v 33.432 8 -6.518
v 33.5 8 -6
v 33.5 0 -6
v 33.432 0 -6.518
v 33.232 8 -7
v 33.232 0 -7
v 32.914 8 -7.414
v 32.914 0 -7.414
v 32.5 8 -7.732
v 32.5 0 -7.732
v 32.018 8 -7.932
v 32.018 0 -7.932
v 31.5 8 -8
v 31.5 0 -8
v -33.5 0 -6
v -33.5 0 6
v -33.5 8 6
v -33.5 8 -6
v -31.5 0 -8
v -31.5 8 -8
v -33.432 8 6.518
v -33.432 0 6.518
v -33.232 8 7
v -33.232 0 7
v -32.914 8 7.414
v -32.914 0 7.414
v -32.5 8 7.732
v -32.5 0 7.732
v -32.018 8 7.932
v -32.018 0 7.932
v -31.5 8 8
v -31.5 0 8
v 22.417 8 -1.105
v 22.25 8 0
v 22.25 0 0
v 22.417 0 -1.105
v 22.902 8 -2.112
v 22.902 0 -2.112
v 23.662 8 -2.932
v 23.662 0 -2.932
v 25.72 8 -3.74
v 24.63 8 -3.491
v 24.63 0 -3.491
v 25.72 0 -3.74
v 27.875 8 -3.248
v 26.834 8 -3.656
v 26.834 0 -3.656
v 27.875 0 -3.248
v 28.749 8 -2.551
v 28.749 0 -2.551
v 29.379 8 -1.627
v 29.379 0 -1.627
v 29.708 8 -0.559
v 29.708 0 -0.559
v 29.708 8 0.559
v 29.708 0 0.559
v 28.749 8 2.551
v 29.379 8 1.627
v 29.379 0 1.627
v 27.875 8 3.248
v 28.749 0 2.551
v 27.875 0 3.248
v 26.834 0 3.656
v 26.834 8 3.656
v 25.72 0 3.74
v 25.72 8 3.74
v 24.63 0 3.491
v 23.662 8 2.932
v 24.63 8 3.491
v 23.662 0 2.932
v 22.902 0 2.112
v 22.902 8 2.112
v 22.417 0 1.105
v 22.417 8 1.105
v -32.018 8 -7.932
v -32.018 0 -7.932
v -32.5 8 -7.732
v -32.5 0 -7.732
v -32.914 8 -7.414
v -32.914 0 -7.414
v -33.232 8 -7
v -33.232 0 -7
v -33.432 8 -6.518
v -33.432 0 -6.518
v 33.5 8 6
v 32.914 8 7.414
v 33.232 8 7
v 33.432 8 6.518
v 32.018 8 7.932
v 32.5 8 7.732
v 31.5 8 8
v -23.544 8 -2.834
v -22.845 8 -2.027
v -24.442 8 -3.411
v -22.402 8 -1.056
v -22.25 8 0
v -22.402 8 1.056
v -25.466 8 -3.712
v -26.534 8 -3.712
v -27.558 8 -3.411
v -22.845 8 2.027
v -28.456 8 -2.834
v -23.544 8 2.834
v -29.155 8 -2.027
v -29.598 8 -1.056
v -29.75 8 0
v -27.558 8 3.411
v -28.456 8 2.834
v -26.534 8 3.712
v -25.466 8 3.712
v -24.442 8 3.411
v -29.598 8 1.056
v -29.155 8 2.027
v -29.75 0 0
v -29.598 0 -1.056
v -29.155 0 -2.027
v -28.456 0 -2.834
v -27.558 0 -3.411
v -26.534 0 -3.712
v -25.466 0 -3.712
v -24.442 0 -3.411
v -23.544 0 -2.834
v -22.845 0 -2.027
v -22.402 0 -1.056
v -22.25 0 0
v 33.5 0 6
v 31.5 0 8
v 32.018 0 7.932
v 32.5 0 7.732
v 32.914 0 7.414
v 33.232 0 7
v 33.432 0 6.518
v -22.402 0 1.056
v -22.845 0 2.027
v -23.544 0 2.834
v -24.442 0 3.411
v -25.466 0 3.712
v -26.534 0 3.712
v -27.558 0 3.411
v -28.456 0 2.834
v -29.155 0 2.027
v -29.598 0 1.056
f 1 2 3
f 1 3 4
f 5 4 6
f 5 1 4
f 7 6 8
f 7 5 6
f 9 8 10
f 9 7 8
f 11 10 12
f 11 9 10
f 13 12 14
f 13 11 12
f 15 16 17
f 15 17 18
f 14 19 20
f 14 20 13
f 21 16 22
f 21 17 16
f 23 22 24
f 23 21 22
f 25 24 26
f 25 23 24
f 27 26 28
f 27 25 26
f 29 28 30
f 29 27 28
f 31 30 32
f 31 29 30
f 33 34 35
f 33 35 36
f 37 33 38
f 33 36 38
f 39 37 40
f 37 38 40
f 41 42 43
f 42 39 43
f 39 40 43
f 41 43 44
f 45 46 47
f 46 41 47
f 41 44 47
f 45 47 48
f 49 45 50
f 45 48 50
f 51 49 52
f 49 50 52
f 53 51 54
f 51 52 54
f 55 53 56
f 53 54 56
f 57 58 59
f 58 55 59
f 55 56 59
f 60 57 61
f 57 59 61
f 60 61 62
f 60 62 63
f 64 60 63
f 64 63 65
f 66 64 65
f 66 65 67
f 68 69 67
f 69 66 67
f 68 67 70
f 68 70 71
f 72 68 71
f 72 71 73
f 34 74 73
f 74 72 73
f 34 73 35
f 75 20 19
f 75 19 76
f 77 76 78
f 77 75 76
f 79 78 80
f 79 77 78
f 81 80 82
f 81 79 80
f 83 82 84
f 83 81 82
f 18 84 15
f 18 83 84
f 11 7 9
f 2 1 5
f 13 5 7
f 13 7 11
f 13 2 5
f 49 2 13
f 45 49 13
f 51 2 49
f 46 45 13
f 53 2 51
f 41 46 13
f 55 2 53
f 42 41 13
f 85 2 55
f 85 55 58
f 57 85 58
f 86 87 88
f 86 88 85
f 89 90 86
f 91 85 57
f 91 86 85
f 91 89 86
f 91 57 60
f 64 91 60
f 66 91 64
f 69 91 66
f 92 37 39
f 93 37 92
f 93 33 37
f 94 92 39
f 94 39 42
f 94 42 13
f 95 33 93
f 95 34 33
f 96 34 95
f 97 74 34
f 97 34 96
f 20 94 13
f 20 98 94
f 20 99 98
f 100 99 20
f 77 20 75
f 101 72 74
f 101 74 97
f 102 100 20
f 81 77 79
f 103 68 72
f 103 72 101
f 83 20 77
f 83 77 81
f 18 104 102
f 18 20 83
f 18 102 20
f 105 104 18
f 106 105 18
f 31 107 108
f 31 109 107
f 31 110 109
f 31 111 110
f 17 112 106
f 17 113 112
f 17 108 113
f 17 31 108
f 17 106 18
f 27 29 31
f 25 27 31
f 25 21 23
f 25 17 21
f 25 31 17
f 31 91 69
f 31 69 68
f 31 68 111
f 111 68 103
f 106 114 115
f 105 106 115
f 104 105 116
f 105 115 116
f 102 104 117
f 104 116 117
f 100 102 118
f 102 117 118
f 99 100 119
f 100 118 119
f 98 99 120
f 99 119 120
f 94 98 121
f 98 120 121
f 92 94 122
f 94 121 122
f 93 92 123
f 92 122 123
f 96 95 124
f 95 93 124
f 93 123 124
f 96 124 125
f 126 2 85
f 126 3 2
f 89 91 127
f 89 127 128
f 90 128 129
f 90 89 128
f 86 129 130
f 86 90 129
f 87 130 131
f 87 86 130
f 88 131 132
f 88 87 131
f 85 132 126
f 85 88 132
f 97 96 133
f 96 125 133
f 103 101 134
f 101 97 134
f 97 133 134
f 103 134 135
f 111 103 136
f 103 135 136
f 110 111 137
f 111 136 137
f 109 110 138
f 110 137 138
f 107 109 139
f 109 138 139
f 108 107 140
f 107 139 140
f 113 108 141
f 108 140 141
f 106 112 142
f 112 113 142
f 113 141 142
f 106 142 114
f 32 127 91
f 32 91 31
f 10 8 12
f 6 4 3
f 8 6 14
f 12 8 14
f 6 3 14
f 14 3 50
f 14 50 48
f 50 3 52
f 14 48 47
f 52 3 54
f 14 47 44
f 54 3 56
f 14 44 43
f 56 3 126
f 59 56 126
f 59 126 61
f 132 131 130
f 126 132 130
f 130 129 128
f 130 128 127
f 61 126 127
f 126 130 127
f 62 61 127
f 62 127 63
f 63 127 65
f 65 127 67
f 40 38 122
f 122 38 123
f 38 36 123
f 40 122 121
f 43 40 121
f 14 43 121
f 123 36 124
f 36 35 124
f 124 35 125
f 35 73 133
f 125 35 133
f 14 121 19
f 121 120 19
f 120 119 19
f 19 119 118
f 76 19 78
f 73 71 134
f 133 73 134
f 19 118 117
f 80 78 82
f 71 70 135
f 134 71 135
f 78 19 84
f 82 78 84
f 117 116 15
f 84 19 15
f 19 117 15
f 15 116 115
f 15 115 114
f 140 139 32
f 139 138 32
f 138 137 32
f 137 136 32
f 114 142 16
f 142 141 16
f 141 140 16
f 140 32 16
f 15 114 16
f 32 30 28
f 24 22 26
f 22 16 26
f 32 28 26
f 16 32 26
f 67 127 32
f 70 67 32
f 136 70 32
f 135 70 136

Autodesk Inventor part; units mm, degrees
ref_plane "YZ Plane" through (0, 0, 0) normal (1, 0, 0) x (0, 1, 0)
ref_plane "XZ Plane" through (0, 0, 0) normal (0, 1, 0) x (-1, 0, 0)
ref_plane "XY Plane" through (0, 0, 0) normal (0, 0, 1) x (1, 0, 0)
sketch "Sketch1" plane through (0, 0, 0) normal (0, 1, 0) x (-1, 0, 0)
  line L0 (-33.5, 8) -> (33.5, 8)
  line L1 (33.5, 8) -> (33.5, -8)
  line L2 (33.5, -8) -> (-33.5, -8)
  line L3 (-33.5, -8) -> (-33.5, 8)
  line L4 (-33.5, 8) -> (33.5, -8) construction
  line L5 (33.5, 8) -> (-33.5, -8) construction
  line L6 (46.9, 0) -> (-46.9, 0) construction
  line L7 (0, -11.2) -> (0, 11.2) construction
  line L8 (26, 0) -> (-26, 0)
  circle A0 centre (26, 0) radius 3.75
  circle A1 centre (-26, 0) radius 3.75
  point P0 (0, 0)
  dimension "d0" = 16
  dimension "d1" = 67
  dimension "d2" = 52
  dimension "d3" = 7.5
extrude "Extrusion1" add sketch "Sketch1" along normal blind 8
fillet "Fillet1" radius 2 4 edges at (33.5, 4, 8) (-33.5, 4, 8) (-33.5, 4, -8) (33.5, 4, -8)
properties part number "07_Mieng_go_bu_67x16" material "Laminated Veneer Lumber"
